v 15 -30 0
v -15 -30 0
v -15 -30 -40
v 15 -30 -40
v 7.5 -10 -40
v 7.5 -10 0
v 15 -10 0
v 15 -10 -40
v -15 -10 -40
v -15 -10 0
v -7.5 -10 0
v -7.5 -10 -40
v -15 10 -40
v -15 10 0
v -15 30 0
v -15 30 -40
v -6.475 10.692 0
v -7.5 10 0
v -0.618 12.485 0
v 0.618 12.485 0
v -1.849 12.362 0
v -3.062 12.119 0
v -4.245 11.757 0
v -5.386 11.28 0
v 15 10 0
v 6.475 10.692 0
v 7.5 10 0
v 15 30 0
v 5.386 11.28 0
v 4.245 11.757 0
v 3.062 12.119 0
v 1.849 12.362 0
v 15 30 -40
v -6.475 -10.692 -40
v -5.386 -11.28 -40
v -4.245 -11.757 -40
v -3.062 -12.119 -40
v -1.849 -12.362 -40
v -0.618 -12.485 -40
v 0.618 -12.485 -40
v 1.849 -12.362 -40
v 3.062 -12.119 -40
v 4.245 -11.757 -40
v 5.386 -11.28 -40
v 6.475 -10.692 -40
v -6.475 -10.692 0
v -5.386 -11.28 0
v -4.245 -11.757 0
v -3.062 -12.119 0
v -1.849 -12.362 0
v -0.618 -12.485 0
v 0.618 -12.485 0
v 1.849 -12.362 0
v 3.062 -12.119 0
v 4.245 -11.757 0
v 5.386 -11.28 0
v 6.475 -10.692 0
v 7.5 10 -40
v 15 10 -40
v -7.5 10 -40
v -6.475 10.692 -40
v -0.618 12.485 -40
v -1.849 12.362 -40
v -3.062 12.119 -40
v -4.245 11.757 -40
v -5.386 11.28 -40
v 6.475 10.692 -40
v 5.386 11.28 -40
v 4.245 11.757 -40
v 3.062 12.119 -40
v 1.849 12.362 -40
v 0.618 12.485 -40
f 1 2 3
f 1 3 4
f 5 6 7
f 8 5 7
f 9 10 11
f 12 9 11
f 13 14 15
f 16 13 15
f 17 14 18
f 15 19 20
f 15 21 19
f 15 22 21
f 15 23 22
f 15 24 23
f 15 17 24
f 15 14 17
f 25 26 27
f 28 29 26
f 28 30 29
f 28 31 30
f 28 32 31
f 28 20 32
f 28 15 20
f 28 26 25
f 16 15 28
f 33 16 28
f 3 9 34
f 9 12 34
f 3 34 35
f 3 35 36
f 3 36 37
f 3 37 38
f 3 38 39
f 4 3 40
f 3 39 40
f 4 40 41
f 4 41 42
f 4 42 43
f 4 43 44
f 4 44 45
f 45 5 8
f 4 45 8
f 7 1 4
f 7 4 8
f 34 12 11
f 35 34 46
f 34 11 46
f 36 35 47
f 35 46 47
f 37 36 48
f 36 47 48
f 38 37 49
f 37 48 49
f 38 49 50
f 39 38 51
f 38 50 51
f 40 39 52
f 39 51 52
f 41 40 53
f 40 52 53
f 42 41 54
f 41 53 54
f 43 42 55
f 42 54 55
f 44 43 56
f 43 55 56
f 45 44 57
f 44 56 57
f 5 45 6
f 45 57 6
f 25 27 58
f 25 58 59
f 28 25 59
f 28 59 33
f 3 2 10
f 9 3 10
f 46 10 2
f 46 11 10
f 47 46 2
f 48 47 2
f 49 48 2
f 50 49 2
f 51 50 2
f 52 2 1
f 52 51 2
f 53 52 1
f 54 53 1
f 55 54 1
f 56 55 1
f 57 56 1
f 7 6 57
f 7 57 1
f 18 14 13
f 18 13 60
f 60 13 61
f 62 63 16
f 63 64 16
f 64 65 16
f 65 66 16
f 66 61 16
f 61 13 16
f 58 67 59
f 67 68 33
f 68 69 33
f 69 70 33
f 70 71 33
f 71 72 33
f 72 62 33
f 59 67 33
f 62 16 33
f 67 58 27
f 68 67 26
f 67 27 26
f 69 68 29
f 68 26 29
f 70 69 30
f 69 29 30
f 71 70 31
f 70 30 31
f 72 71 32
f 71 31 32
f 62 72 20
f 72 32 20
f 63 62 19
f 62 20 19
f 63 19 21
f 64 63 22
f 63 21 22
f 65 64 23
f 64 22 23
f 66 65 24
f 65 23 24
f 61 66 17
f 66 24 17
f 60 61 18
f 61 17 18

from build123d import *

# Parameters (mm, degrees)
SKIZZE1_W                         = 30
SKIZZE1_H                         = 20
AUFSATZ_LINEAR_AUSTRAGEN1_DEPTH   = 40
AUFSATZ_LINEAR_AUSTRAGEN1_2_DEPTH = 40
SKIZZE2_R                         = 12.5
SCHNITT_LINEAR_AUSTRAGEN1_DEPTH   = 50


with BuildPart() as part:
    # Skizze1 → Aufsatz-Linear austragen1 (new body)
    with BuildSketch(Plane.XY):
        with Locations((0, 20)):
            Rectangle(SKIZZE1_W, SKIZZE1_H)
    extrude(amount=-AUFSATZ_LINEAR_AUSTRAGEN1_DEPTH)


with BuildPart() as body_2:
    # Skizze1 → Aufsatz-Linear austragen1 2 (new body)
    with BuildSketch(Plane.XY):
        with Locations((0, -20)):
            Rectangle(SKIZZE1_W, SKIZZE1_H)
    extrude(amount=-AUFSATZ_LINEAR_AUSTRAGEN1_2_DEPTH)


with BuildPart() as schnitt_linear_austragen1_tool:
    # Skizze2 → Schnitt-Linear austragen1 (new body)
    with BuildSketch(Plane.XY):
        Circle(SKIZZE2_R)
    extrude(amount=-SCHNITT_LINEAR_AUSTRAGEN1_DEPTH)


with BuildPart() as part_1:
    add(part.part)

    # Schnitt-Linear austragen1: cut by schnitt_linear_austragen1_tool
    add(schnitt_linear_austragen1_tool.part, mode=Mode.SUBTRACT)


with BuildPart() as body_2_1:
    add(body_2.part)

    # Schnitt-Linear austragen1: cut by schnitt_linear_austragen1_tool
    add(schnitt_linear_austragen1_tool.part, mode=Mode.SUBTRACT)


solid = Compound([part_1.part, body_2_1.part])
